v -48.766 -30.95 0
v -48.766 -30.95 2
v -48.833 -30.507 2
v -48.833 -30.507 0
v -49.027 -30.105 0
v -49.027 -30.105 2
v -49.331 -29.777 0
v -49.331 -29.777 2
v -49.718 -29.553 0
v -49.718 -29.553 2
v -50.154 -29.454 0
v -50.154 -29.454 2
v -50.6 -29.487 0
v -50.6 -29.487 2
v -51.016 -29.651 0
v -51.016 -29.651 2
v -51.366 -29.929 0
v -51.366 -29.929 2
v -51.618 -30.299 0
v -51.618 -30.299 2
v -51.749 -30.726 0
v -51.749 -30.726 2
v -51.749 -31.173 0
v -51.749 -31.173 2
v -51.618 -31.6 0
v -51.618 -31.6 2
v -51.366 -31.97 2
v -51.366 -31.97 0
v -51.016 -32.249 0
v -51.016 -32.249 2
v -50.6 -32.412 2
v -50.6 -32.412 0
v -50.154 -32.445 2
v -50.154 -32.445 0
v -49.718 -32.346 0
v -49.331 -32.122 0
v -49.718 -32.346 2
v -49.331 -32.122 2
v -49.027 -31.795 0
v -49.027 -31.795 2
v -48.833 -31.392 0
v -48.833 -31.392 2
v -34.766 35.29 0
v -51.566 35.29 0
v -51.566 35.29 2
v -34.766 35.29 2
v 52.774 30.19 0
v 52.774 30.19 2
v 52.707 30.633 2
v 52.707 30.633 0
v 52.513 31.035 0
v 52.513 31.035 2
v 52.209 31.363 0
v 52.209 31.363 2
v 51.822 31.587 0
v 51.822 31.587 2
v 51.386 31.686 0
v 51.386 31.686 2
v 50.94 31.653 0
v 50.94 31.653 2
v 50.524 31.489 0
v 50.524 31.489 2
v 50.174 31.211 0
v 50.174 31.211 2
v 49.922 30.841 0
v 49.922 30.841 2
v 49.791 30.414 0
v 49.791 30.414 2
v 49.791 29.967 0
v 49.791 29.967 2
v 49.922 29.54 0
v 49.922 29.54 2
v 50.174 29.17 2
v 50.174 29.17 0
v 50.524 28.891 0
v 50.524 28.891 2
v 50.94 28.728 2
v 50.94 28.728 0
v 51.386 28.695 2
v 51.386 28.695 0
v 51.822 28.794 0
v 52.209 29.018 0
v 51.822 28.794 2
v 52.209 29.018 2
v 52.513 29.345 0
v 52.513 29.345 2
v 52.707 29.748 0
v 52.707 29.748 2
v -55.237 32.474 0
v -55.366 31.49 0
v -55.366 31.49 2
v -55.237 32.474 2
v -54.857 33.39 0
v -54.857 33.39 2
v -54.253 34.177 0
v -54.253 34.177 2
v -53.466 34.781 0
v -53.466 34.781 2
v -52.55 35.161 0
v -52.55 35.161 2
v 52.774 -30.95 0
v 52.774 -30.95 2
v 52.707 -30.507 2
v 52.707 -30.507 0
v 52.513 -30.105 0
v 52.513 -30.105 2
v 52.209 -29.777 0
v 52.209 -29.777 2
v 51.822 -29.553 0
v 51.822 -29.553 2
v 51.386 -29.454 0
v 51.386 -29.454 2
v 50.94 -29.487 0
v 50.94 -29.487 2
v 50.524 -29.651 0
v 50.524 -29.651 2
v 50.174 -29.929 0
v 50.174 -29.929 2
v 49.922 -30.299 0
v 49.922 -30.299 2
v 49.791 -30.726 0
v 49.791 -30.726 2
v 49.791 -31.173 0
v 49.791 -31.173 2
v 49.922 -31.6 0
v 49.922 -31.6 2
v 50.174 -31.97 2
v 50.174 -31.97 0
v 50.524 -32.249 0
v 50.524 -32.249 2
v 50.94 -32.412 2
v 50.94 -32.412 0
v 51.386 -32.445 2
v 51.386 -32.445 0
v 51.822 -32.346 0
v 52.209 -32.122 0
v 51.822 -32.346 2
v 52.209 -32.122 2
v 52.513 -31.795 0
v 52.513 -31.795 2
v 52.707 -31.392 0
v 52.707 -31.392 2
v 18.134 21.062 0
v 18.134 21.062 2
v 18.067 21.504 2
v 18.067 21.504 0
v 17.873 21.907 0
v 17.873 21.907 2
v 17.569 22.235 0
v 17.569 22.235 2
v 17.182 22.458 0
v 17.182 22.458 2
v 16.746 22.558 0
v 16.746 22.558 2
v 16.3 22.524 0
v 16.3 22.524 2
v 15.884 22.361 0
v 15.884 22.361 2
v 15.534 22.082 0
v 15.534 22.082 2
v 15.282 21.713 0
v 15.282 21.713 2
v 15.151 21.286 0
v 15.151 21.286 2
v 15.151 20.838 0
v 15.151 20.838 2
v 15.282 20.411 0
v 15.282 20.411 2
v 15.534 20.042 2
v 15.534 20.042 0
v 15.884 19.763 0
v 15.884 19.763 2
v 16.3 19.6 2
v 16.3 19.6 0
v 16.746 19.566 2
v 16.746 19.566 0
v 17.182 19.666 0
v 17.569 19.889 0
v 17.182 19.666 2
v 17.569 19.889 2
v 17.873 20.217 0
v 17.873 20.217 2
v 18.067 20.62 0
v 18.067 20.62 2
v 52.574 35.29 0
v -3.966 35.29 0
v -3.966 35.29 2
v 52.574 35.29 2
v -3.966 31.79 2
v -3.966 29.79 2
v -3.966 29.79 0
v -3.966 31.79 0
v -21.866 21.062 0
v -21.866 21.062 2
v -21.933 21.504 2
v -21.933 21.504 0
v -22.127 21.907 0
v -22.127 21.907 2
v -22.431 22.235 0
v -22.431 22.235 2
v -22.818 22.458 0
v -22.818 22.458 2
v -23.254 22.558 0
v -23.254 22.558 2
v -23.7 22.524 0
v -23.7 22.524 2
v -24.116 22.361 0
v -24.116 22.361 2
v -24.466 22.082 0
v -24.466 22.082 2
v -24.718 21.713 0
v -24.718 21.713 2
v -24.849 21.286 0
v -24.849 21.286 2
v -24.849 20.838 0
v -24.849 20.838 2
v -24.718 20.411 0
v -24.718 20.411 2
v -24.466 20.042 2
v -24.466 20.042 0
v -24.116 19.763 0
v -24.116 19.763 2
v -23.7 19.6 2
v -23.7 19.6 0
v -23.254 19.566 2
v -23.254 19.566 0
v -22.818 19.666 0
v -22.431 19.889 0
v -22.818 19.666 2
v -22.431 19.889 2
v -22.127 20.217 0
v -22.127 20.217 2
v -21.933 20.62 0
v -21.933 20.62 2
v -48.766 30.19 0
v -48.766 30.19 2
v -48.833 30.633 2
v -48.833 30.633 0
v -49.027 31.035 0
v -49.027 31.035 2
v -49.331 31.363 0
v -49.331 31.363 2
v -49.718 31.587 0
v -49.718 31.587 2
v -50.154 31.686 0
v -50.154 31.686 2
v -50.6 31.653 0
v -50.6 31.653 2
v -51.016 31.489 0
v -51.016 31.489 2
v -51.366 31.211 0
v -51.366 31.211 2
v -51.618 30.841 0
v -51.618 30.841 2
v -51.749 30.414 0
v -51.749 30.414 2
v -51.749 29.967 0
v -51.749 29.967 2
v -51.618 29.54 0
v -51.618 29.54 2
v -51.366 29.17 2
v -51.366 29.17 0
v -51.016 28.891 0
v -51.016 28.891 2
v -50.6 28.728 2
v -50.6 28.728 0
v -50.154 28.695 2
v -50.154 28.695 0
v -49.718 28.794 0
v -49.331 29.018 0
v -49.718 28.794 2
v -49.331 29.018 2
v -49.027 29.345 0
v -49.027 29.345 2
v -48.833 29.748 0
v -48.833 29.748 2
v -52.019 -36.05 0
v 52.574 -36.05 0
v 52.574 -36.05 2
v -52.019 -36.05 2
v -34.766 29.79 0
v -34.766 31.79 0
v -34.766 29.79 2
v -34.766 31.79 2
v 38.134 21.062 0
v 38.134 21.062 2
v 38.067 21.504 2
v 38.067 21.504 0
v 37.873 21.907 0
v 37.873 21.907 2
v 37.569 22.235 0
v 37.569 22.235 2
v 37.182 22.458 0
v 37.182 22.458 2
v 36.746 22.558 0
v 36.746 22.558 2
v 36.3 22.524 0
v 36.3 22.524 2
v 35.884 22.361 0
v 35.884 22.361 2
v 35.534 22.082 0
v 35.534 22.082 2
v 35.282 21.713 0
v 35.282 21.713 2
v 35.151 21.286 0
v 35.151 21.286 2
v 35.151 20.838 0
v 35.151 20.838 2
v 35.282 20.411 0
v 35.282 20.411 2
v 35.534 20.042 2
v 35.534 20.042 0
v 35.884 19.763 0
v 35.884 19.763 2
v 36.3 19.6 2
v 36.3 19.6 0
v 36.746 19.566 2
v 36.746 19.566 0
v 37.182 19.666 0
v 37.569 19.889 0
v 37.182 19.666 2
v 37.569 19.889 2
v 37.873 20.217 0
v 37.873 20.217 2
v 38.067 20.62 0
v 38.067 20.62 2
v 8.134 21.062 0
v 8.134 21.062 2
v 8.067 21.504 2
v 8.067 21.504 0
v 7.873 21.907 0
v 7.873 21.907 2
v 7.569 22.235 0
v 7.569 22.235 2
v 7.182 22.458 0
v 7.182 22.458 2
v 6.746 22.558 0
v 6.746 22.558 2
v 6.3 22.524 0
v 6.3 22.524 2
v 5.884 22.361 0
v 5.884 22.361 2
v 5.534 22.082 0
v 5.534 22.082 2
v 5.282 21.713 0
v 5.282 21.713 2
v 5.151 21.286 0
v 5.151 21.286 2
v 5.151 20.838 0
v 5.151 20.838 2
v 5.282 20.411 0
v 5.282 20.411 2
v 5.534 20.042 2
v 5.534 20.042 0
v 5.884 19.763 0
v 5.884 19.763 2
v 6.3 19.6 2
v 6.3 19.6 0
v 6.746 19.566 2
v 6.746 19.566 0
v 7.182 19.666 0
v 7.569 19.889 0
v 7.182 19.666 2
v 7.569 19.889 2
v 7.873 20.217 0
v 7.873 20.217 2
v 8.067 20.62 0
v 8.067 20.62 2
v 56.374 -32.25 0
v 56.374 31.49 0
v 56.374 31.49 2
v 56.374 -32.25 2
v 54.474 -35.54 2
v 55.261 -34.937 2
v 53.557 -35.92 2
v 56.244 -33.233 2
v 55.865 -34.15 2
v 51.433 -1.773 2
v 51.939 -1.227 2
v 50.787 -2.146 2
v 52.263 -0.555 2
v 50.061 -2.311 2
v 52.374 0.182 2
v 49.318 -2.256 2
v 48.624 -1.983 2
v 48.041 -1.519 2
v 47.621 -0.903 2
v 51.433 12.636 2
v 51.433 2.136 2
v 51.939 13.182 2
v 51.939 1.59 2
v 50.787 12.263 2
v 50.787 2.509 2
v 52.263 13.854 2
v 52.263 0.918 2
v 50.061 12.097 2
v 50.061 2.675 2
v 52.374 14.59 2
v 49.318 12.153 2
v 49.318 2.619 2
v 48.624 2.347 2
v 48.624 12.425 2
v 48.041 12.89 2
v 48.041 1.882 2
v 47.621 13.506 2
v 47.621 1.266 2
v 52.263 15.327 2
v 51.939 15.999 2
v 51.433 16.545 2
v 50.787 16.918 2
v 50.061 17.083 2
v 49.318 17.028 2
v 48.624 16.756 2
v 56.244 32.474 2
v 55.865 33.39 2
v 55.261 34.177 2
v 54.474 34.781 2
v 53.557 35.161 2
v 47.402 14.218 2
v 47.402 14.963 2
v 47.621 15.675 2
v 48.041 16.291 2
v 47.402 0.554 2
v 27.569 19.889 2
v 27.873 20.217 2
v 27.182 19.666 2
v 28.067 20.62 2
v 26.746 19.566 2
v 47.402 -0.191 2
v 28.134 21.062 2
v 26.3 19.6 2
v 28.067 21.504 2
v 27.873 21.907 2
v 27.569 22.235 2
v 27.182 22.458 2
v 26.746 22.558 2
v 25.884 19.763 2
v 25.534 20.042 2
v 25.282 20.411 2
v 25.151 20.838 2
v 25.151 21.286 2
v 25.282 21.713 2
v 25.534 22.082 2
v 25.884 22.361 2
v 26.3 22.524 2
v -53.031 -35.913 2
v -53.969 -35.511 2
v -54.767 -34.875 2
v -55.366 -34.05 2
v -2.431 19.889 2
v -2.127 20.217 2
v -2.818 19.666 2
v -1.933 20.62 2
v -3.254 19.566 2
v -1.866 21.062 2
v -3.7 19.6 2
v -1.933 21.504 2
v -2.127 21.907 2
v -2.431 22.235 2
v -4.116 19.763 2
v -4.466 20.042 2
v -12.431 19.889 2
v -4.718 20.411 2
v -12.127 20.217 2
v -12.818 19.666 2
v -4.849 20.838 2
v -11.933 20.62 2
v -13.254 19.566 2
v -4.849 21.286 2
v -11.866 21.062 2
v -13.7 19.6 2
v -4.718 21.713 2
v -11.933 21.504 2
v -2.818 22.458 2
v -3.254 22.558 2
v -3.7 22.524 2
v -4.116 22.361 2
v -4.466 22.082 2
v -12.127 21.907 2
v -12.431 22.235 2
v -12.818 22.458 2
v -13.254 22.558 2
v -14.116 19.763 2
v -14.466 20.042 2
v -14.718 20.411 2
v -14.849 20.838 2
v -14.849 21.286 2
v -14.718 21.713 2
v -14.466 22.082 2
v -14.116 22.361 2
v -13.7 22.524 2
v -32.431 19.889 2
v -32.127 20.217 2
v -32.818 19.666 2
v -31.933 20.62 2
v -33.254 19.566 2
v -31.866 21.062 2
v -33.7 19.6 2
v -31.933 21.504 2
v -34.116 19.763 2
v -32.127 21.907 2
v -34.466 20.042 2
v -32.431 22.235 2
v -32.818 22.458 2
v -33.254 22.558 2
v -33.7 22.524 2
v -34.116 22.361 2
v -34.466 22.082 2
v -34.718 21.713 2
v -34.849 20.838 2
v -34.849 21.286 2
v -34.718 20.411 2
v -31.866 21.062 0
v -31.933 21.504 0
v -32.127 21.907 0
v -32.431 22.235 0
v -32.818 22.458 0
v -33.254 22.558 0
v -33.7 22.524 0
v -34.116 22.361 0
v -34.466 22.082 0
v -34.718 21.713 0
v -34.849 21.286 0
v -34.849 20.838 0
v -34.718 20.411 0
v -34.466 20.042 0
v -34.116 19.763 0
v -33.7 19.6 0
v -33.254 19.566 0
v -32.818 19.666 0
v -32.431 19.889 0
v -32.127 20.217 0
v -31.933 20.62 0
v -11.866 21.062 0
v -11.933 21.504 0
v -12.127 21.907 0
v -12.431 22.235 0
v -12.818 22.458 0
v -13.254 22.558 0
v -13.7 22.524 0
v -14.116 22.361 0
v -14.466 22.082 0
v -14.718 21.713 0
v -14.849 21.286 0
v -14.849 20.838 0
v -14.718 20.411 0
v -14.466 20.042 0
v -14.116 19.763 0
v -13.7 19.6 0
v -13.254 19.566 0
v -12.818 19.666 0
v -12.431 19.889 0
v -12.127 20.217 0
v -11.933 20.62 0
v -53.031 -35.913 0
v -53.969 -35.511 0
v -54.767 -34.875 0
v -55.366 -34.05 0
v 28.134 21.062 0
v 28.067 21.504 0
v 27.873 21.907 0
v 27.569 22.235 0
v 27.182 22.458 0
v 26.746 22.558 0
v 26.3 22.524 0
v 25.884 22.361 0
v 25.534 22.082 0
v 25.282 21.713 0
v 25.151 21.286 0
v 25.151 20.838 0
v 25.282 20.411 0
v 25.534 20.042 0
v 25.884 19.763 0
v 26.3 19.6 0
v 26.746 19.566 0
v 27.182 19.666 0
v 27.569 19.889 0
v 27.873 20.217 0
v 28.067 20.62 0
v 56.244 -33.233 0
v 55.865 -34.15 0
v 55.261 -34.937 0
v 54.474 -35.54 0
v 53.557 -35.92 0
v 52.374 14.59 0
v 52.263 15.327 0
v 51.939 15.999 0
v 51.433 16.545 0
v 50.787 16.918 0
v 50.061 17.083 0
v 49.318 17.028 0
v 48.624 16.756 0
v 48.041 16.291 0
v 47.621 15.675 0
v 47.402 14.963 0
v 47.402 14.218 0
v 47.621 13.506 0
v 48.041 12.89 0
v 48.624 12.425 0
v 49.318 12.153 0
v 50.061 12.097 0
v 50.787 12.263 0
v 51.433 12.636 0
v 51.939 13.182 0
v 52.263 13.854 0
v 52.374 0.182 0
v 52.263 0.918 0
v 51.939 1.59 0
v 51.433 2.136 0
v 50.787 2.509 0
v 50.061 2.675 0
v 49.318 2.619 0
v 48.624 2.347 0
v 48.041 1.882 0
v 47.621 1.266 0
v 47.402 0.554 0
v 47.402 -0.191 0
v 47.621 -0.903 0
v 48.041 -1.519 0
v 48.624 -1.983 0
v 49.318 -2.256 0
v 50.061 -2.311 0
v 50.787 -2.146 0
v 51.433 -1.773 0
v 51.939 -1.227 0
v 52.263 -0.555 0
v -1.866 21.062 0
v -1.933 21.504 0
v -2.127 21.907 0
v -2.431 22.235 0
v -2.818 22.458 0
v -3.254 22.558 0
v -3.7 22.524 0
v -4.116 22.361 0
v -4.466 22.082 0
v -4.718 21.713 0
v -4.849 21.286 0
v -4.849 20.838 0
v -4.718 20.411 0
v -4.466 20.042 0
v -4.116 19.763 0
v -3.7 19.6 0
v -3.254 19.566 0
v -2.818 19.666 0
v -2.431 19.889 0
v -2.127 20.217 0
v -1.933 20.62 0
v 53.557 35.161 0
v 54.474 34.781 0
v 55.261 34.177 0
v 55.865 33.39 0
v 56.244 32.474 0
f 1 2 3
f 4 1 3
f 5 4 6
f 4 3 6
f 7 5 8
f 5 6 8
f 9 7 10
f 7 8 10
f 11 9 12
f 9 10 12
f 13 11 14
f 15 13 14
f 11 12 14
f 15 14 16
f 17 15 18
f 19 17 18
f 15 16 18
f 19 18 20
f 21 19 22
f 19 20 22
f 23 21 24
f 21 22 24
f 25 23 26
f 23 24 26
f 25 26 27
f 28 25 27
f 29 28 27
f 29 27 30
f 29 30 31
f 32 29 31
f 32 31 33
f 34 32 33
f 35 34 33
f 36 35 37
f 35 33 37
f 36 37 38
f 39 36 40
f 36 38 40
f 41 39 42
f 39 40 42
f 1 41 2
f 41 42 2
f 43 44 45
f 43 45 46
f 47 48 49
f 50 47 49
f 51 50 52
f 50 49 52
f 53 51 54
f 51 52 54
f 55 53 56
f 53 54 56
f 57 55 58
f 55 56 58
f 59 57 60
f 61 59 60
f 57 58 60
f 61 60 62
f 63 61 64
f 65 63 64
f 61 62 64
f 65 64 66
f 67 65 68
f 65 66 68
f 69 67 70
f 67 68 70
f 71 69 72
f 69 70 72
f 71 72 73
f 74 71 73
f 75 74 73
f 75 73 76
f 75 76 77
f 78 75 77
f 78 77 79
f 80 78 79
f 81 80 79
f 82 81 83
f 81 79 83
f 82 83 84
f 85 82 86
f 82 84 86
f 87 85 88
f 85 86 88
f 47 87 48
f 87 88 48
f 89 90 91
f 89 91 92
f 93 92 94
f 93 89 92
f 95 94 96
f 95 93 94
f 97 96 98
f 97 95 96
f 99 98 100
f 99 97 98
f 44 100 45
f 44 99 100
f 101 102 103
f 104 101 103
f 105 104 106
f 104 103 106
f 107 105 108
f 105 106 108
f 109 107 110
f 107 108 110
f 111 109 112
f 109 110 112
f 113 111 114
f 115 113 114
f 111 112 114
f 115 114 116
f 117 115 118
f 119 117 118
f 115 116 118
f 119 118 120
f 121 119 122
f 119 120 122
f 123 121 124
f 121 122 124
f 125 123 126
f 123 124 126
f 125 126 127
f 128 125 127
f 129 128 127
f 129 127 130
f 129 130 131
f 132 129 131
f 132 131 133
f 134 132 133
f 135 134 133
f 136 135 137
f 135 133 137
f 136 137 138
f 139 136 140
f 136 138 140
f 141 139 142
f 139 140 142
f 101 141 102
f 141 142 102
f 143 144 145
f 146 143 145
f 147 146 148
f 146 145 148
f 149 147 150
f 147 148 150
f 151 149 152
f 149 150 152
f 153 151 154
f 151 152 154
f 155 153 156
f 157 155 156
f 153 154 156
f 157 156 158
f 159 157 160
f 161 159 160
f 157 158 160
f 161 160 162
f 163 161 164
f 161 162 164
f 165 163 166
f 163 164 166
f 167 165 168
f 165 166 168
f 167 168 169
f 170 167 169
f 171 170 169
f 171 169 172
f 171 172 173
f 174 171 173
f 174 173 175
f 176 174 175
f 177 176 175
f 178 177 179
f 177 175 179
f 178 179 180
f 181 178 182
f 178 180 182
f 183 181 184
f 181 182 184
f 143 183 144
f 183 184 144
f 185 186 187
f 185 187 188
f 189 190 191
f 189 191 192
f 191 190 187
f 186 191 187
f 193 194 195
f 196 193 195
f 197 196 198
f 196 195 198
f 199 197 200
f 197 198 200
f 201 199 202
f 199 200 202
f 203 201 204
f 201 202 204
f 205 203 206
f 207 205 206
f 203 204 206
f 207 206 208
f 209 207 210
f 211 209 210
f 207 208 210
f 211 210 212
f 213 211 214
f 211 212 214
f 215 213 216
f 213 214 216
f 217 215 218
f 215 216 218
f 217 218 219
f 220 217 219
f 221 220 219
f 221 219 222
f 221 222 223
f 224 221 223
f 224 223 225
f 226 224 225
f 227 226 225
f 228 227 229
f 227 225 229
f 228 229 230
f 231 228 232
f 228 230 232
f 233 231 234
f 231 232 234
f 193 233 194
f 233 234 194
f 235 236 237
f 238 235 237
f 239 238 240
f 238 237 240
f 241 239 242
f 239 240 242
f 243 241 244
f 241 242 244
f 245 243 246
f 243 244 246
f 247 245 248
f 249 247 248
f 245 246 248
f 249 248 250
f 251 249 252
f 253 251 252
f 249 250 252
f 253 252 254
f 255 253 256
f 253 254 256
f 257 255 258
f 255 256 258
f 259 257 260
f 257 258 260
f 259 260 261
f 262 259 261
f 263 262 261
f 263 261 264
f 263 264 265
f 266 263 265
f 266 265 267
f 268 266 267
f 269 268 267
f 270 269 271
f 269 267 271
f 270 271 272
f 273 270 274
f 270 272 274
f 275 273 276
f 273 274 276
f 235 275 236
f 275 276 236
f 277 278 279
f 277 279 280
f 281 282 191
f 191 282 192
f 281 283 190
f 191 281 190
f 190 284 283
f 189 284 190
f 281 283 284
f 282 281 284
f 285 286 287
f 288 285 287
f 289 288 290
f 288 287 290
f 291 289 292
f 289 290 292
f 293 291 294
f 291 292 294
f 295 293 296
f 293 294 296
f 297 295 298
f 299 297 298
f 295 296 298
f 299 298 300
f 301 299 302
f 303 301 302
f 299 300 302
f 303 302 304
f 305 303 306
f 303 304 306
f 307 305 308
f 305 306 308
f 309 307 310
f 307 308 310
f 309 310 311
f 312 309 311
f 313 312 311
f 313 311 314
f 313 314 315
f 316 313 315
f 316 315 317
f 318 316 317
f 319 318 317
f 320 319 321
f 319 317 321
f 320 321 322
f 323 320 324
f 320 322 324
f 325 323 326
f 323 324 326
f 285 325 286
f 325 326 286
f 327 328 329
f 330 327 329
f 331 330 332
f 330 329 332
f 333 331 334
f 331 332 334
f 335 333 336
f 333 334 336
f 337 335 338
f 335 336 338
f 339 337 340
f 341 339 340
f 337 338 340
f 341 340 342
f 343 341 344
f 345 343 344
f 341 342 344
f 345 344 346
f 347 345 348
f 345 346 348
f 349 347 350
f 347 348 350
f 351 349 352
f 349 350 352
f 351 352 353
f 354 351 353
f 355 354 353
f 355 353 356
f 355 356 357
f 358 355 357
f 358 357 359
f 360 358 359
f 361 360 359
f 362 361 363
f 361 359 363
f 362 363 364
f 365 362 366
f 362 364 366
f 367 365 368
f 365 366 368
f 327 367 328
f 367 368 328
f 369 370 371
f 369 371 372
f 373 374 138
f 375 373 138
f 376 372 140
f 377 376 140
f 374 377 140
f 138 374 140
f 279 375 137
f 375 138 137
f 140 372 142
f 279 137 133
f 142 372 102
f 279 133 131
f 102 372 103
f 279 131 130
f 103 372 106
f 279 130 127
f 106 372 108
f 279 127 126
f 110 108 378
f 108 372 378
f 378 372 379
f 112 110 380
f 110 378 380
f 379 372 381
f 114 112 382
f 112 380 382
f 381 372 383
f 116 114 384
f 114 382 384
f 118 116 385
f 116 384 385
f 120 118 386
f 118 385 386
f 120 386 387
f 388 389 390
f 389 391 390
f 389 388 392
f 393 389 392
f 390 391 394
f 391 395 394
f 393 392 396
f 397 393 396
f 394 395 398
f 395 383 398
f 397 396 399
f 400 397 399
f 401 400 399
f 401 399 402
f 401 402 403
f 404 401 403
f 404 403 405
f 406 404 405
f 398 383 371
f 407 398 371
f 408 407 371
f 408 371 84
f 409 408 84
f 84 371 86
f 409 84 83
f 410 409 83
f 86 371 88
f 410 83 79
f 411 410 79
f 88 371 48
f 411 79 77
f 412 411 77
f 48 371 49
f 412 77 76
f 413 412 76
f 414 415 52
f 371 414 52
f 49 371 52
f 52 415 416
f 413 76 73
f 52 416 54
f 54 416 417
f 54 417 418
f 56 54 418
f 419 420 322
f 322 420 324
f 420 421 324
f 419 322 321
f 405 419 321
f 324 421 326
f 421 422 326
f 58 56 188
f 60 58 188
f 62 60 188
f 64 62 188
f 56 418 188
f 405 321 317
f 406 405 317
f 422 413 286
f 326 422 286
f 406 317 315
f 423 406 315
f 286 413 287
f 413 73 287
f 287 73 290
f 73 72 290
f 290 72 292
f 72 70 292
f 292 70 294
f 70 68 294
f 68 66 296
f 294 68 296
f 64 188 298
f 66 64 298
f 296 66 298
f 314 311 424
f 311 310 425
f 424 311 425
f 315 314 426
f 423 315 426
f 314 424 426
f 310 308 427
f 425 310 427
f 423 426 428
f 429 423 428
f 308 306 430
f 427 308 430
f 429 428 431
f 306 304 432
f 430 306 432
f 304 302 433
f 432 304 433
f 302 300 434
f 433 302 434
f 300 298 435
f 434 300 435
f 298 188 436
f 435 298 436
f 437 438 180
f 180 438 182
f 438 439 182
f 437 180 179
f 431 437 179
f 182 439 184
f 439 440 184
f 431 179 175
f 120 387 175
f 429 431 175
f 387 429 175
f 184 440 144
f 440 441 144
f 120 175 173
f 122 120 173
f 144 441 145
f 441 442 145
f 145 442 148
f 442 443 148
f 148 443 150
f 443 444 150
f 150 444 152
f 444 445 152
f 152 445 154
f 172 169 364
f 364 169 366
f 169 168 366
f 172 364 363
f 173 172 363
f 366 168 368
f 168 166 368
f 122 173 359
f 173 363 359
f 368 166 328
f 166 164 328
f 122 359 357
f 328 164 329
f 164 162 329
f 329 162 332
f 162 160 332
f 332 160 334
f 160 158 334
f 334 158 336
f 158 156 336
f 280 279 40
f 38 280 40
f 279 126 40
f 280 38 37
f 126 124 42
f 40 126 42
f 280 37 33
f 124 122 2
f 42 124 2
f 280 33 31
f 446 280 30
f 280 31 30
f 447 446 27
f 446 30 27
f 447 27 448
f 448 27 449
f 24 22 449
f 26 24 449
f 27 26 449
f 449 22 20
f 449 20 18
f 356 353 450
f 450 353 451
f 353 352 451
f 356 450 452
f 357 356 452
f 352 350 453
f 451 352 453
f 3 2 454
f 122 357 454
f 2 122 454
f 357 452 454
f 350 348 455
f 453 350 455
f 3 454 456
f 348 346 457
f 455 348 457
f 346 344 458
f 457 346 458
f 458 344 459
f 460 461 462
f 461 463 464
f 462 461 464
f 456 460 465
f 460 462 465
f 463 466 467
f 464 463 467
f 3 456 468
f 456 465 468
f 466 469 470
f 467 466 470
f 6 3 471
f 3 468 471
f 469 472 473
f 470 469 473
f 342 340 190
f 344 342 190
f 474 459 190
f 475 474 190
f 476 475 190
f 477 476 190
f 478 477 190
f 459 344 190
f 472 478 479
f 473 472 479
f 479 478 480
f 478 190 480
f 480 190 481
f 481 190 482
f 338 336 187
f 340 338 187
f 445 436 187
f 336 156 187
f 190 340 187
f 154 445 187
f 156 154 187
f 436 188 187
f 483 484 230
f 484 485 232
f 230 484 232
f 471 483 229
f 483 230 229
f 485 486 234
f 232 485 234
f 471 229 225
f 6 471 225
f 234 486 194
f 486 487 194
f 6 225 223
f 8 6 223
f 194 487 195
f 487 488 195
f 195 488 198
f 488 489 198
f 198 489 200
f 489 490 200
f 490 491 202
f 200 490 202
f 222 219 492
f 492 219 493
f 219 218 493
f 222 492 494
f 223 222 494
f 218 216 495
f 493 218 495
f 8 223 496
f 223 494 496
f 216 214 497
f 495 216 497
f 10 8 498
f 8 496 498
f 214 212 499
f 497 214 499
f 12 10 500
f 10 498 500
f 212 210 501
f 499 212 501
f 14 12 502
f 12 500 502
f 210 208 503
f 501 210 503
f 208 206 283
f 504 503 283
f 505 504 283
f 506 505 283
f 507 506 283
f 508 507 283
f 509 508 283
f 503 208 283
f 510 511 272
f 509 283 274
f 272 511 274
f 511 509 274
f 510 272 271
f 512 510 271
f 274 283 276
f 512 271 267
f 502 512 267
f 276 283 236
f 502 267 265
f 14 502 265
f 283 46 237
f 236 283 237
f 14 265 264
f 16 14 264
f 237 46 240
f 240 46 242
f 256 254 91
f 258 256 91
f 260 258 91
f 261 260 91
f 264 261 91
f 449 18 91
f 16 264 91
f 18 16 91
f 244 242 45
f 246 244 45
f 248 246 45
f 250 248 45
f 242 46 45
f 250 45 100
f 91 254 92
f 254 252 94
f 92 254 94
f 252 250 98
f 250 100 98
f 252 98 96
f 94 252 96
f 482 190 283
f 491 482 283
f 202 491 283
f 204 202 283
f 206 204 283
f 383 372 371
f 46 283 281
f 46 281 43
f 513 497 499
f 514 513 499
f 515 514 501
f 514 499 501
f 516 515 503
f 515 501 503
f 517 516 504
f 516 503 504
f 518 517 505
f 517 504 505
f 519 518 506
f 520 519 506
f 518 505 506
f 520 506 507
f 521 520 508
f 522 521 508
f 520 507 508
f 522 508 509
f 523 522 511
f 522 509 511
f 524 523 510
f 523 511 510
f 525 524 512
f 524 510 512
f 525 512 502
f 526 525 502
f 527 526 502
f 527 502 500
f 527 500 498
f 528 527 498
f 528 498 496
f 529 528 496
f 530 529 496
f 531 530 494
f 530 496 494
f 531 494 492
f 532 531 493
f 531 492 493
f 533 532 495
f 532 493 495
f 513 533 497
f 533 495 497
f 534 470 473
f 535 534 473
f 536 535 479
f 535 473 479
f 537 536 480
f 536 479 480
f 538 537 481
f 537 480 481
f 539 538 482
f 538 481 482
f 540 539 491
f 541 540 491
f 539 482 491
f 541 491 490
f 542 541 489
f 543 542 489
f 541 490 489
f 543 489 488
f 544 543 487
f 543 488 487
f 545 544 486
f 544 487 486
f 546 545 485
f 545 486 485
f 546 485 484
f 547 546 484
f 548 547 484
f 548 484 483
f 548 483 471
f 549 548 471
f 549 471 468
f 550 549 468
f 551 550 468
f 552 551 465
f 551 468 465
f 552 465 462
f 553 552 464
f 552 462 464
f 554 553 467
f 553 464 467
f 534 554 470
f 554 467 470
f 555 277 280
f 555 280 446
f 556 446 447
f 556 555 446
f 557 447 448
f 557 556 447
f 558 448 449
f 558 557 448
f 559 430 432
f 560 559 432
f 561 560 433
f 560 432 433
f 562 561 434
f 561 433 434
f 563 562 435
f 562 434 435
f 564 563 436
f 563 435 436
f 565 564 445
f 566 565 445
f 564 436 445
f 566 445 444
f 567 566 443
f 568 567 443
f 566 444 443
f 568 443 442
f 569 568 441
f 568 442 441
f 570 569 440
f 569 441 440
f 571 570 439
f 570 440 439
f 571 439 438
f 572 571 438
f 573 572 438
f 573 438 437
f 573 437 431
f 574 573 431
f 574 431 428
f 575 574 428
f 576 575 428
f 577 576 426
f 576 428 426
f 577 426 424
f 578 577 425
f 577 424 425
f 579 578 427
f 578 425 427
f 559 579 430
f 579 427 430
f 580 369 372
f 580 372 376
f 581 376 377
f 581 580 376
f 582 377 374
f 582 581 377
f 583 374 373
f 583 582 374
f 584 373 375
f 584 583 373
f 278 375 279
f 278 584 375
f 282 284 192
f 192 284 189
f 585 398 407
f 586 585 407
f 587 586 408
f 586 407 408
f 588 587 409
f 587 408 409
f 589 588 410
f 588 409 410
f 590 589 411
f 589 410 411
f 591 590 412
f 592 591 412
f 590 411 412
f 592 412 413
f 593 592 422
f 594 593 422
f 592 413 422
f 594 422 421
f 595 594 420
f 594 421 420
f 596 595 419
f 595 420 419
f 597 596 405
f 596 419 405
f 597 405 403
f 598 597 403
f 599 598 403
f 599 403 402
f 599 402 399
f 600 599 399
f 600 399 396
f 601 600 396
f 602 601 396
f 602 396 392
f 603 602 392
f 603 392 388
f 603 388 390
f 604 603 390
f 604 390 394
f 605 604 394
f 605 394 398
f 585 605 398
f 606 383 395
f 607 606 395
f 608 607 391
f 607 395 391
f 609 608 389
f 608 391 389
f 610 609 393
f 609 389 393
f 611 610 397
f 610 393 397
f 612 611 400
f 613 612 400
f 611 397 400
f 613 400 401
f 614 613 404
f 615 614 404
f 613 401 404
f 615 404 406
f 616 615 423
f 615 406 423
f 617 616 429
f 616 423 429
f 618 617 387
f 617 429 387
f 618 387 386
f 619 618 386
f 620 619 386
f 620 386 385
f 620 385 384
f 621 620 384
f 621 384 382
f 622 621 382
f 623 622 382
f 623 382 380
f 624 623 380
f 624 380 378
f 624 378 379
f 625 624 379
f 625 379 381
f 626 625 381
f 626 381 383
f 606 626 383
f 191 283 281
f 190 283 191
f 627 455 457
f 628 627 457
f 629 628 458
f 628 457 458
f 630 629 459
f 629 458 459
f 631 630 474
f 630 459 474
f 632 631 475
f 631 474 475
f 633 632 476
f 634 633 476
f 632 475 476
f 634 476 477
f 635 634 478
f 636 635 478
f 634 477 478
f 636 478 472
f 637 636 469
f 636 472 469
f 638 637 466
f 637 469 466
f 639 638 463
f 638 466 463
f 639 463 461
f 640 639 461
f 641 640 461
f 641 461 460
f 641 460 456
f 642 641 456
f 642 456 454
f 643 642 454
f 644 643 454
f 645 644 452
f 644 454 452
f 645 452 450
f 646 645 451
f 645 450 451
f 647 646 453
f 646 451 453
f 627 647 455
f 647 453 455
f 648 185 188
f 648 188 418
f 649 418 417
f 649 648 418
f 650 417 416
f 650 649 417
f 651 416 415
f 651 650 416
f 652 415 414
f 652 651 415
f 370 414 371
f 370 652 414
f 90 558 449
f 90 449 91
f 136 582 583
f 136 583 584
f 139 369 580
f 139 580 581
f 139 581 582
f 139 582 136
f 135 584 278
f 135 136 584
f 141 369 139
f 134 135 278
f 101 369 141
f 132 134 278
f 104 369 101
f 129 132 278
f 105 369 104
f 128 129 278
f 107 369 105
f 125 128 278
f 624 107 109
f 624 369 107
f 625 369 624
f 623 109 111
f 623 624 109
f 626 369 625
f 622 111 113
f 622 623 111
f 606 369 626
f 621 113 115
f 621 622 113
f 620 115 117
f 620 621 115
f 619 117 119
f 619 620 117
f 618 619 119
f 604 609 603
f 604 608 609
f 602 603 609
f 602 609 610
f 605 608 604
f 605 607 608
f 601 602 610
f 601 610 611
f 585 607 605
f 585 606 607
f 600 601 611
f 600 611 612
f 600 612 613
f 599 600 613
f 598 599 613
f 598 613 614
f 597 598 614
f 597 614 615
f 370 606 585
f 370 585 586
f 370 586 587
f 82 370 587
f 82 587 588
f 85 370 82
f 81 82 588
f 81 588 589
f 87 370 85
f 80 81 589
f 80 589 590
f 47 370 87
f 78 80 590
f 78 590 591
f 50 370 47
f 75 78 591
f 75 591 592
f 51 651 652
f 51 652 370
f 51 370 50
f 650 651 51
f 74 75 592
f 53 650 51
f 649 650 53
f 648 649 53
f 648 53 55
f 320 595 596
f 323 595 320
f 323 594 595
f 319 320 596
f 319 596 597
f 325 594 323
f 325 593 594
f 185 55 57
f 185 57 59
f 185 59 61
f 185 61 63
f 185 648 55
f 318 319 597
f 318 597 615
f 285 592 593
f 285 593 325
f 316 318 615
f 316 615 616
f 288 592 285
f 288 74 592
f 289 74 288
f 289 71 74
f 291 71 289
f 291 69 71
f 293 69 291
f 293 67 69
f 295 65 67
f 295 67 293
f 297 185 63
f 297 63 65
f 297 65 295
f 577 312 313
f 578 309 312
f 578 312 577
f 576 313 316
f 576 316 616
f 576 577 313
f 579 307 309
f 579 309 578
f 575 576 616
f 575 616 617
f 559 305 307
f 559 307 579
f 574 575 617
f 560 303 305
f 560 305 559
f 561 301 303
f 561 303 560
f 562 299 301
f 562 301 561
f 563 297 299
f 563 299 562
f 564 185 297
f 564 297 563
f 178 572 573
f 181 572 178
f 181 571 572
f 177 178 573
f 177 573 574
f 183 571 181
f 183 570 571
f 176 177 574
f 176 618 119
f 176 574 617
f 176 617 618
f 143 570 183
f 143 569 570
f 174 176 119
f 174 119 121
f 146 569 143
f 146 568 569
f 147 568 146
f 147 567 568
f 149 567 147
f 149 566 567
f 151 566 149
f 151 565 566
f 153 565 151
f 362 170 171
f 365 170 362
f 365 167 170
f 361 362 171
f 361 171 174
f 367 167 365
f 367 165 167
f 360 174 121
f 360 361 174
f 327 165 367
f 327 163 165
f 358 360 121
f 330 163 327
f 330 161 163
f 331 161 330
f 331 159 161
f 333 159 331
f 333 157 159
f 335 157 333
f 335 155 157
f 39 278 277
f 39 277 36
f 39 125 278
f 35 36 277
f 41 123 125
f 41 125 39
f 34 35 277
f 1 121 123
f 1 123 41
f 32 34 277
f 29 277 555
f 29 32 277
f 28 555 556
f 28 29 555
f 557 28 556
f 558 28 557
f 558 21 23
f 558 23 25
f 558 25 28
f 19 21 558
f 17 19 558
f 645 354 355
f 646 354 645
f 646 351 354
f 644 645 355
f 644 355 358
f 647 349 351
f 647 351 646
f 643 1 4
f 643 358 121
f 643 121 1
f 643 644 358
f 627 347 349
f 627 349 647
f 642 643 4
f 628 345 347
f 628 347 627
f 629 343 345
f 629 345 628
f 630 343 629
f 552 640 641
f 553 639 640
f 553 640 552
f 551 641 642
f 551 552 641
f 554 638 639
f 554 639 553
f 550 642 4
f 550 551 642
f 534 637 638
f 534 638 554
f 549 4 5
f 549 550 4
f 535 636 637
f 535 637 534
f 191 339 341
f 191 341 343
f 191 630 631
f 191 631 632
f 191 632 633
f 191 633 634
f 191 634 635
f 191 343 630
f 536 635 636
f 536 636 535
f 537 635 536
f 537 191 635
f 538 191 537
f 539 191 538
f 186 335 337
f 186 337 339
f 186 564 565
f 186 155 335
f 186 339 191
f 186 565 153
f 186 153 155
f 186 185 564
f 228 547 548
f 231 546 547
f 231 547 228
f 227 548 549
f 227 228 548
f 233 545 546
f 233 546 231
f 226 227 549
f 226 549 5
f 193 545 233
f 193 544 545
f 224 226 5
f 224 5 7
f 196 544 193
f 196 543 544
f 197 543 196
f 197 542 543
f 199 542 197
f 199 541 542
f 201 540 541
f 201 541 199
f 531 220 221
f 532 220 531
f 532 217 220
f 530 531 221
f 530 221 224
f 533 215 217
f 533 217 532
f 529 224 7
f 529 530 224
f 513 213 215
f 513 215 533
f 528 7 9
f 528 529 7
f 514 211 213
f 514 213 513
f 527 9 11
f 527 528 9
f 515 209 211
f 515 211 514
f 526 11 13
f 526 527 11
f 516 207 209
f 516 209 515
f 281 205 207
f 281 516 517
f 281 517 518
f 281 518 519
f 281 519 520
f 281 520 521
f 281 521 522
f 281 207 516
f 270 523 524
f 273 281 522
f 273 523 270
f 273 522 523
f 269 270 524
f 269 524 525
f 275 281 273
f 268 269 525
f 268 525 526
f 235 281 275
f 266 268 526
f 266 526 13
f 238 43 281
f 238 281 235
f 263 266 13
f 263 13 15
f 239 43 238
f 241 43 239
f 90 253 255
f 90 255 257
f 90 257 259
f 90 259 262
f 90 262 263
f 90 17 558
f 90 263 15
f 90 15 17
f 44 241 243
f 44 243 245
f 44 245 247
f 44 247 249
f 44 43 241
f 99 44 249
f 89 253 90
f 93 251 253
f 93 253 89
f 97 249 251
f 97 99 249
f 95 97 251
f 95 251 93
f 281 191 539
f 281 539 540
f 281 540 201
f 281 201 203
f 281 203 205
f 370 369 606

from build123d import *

# Parameters (mm, degrees)
SKIZZE1_R                       = 1.05
AUFSATZ_LINEAR_AUSTRAGEN1_DEPTH = 2
SKIZZE2_R                       = 1.5
SCHNITT_LINEAR_AUSTRAGEN1_DEPTH = 2
SKIZZE3_W                       = 1.4
SKIZZE3_H                       = 5.5
SCHNITT_LINEAR_AUSTRAGEN2_DEPTH = 2
SKIZZE4_W                       = 30.8
SKIZZE4_H                       = 2
AUFSATZ_LINEAR_AUSTRAGEN2_DEPTH = 2
SKIZZE6_R                       = 2.5
SCHNITT_LINEAR_AUSTRAGEN4_DEPTH = 10


with BuildPart() as part:
    # Skizze1 → Aufsatz-Linear austragen1 (new body)
    with BuildSketch(Plane.XY):
        with BuildLine():
            Line((-55.366132402, -34.049552882), (-55.366132402, 31.490447118))
            ThreePointArc((-55.366132402, 31.490447118), (-54.253138171, 34.177452886), (-51.566132402, 35.290447118))
            Line((-51.566132402, 35.290447118), (-33.366132402, 35.290447118))
            Line((-33.366132402, 35.290447118), (-33.366132402, 29.790447118))
            Line((-33.366132402, 29.790447118), (-5.366132402, 29.790447118))
            Line((-5.366132402, 29.790447118), (-5.366132402, 35.290447118))
            Line((-5.366132402, 35.290447118), (52.573867598, 35.290447118))
            ThreePointArc((52.573867598, 35.290447118), (55.260873366, 34.177452886), (56.373867598, 31.490447118))
            Line((56.373867598, 31.490447118), (56.373867598, -32.249552882))
            ThreePointArc((56.373867598, -32.249552882), (55.260873366, -34.936558651), (52.573867598, -36.049552882))
            Line((52.573867598, -36.049552882), (48.523867598, -36.049552882))
            Line((48.523867598, -36.049552882), (-48.019492296, -36.049552882))
            Line((-48.019492296, -36.049552882), (-52.019492296, -36.049552882))
            ThreePointArc((-52.019492296, -36.049552882), (-53.968851165, -35.511454168), (-55.366132402, -34.049552882))
        make_face()
        with Locations((-50.266132402, 30.190447118)):
            Circle(SKIZZE1_R, mode=Mode.SUBTRACT)
        with Locations((-50.266132402, -30.949552882)):
            Circle(SKIZZE1_R, mode=Mode.SUBTRACT)
        with Locations((51.273867598, -30.949552882)):
            Circle(SKIZZE1_R, mode=Mode.SUBTRACT)
        with BuildLine():
            ThreePointArc((50.223911393, 30.200037089), (50.865581728, 29.223078187), (52.013189365, 29.444857871))
            ThreePointArc((52.013189365, 29.444857871), (51.682153467, 31.157816049), (50.223911393, 30.200037089))
        make_face(mode=Mode.SUBTRACT)
    extrude(amount=AUFSATZ_LINEAR_AUSTRAGEN1_DEPTH)

    # Skizze2 → Schnitt-Linear austragen1 (cut)
    with BuildSketch(Plane.XY.offset(2)):
        with Locations((-33.366132402, 21.061999377)):
            Circle(SKIZZE2_R)
        with Locations((-23.366132402, 21.061999377)):
            Circle(SKIZZE2_R)
        with Locations((-13.366132402, 21.061999377)):
            Circle(SKIZZE2_R)
        with Locations((-3.366132402, 21.061999377)):
            Circle(SKIZZE2_R)
        with Locations((6.633867598, 21.061999377)):
            Circle(SKIZZE2_R)
        with Locations((16.633867598, 21.061999377)):
            Circle(SKIZZE2_R)
        with Locations((26.633867598, 21.061999377)):
            Circle(SKIZZE2_R)
        with Locations((36.633867598, 21.061999377)):
            Circle(SKIZZE2_R)
        with Locations((-50.266132402, 30.190447118)):
            Circle(SKIZZE2_R)
        with Locations((51.273867598, 30.190447118)):
            Circle(SKIZZE2_R)
        with Locations((51.273867598, -30.949552882)):
            Circle(SKIZZE2_R)
        with Locations((-50.266132402, -30.949552882)):
            Circle(SKIZZE2_R)
    extrude(amount=-SCHNITT_LINEAR_AUSTRAGEN1_DEPTH, mode=Mode.SUBTRACT)

    # Skizze3 → Schnitt-Linear austragen2 (cut)
    with BuildSketch(Plane.XY.offset(2)):
        with Locations((-4.666132402, 32.540447118)):
            Rectangle(SKIZZE3_W, SKIZZE3_H)
        with Locations((-34.066132402, 32.540447118)):
            Rectangle(SKIZZE3_W, SKIZZE3_H)
    extrude(amount=-SCHNITT_LINEAR_AUSTRAGEN2_DEPTH, mode=Mode.SUBTRACT)

    # Skizze6 → Schnitt-Linear austragen4 (cut)
    with BuildSketch(Plane.XY.offset(2)):
        with Locations((49.873867598, 14.590447118)):
            Circle(SKIZZE6_R)
        with Locations((49.873867598, 0.181573061)):
            Circle(SKIZZE6_R)
    extrude(amount=-SCHNITT_LINEAR_AUSTRAGEN4_DEPTH, mode=Mode.SUBTRACT)


with BuildPart() as body_2:
    # Skizze4 → Aufsatz-Linear austragen2 (new body)
    with BuildSketch(Plane.XY.offset(2)):
        with Locations((-19.366132402, 30.790447118)):
            Rectangle(SKIZZE4_W, SKIZZE4_H)
    extrude(amount=-AUFSATZ_LINEAR_AUSTRAGEN2_DEPTH)


solid = Compound([part.part, body_2.part])
